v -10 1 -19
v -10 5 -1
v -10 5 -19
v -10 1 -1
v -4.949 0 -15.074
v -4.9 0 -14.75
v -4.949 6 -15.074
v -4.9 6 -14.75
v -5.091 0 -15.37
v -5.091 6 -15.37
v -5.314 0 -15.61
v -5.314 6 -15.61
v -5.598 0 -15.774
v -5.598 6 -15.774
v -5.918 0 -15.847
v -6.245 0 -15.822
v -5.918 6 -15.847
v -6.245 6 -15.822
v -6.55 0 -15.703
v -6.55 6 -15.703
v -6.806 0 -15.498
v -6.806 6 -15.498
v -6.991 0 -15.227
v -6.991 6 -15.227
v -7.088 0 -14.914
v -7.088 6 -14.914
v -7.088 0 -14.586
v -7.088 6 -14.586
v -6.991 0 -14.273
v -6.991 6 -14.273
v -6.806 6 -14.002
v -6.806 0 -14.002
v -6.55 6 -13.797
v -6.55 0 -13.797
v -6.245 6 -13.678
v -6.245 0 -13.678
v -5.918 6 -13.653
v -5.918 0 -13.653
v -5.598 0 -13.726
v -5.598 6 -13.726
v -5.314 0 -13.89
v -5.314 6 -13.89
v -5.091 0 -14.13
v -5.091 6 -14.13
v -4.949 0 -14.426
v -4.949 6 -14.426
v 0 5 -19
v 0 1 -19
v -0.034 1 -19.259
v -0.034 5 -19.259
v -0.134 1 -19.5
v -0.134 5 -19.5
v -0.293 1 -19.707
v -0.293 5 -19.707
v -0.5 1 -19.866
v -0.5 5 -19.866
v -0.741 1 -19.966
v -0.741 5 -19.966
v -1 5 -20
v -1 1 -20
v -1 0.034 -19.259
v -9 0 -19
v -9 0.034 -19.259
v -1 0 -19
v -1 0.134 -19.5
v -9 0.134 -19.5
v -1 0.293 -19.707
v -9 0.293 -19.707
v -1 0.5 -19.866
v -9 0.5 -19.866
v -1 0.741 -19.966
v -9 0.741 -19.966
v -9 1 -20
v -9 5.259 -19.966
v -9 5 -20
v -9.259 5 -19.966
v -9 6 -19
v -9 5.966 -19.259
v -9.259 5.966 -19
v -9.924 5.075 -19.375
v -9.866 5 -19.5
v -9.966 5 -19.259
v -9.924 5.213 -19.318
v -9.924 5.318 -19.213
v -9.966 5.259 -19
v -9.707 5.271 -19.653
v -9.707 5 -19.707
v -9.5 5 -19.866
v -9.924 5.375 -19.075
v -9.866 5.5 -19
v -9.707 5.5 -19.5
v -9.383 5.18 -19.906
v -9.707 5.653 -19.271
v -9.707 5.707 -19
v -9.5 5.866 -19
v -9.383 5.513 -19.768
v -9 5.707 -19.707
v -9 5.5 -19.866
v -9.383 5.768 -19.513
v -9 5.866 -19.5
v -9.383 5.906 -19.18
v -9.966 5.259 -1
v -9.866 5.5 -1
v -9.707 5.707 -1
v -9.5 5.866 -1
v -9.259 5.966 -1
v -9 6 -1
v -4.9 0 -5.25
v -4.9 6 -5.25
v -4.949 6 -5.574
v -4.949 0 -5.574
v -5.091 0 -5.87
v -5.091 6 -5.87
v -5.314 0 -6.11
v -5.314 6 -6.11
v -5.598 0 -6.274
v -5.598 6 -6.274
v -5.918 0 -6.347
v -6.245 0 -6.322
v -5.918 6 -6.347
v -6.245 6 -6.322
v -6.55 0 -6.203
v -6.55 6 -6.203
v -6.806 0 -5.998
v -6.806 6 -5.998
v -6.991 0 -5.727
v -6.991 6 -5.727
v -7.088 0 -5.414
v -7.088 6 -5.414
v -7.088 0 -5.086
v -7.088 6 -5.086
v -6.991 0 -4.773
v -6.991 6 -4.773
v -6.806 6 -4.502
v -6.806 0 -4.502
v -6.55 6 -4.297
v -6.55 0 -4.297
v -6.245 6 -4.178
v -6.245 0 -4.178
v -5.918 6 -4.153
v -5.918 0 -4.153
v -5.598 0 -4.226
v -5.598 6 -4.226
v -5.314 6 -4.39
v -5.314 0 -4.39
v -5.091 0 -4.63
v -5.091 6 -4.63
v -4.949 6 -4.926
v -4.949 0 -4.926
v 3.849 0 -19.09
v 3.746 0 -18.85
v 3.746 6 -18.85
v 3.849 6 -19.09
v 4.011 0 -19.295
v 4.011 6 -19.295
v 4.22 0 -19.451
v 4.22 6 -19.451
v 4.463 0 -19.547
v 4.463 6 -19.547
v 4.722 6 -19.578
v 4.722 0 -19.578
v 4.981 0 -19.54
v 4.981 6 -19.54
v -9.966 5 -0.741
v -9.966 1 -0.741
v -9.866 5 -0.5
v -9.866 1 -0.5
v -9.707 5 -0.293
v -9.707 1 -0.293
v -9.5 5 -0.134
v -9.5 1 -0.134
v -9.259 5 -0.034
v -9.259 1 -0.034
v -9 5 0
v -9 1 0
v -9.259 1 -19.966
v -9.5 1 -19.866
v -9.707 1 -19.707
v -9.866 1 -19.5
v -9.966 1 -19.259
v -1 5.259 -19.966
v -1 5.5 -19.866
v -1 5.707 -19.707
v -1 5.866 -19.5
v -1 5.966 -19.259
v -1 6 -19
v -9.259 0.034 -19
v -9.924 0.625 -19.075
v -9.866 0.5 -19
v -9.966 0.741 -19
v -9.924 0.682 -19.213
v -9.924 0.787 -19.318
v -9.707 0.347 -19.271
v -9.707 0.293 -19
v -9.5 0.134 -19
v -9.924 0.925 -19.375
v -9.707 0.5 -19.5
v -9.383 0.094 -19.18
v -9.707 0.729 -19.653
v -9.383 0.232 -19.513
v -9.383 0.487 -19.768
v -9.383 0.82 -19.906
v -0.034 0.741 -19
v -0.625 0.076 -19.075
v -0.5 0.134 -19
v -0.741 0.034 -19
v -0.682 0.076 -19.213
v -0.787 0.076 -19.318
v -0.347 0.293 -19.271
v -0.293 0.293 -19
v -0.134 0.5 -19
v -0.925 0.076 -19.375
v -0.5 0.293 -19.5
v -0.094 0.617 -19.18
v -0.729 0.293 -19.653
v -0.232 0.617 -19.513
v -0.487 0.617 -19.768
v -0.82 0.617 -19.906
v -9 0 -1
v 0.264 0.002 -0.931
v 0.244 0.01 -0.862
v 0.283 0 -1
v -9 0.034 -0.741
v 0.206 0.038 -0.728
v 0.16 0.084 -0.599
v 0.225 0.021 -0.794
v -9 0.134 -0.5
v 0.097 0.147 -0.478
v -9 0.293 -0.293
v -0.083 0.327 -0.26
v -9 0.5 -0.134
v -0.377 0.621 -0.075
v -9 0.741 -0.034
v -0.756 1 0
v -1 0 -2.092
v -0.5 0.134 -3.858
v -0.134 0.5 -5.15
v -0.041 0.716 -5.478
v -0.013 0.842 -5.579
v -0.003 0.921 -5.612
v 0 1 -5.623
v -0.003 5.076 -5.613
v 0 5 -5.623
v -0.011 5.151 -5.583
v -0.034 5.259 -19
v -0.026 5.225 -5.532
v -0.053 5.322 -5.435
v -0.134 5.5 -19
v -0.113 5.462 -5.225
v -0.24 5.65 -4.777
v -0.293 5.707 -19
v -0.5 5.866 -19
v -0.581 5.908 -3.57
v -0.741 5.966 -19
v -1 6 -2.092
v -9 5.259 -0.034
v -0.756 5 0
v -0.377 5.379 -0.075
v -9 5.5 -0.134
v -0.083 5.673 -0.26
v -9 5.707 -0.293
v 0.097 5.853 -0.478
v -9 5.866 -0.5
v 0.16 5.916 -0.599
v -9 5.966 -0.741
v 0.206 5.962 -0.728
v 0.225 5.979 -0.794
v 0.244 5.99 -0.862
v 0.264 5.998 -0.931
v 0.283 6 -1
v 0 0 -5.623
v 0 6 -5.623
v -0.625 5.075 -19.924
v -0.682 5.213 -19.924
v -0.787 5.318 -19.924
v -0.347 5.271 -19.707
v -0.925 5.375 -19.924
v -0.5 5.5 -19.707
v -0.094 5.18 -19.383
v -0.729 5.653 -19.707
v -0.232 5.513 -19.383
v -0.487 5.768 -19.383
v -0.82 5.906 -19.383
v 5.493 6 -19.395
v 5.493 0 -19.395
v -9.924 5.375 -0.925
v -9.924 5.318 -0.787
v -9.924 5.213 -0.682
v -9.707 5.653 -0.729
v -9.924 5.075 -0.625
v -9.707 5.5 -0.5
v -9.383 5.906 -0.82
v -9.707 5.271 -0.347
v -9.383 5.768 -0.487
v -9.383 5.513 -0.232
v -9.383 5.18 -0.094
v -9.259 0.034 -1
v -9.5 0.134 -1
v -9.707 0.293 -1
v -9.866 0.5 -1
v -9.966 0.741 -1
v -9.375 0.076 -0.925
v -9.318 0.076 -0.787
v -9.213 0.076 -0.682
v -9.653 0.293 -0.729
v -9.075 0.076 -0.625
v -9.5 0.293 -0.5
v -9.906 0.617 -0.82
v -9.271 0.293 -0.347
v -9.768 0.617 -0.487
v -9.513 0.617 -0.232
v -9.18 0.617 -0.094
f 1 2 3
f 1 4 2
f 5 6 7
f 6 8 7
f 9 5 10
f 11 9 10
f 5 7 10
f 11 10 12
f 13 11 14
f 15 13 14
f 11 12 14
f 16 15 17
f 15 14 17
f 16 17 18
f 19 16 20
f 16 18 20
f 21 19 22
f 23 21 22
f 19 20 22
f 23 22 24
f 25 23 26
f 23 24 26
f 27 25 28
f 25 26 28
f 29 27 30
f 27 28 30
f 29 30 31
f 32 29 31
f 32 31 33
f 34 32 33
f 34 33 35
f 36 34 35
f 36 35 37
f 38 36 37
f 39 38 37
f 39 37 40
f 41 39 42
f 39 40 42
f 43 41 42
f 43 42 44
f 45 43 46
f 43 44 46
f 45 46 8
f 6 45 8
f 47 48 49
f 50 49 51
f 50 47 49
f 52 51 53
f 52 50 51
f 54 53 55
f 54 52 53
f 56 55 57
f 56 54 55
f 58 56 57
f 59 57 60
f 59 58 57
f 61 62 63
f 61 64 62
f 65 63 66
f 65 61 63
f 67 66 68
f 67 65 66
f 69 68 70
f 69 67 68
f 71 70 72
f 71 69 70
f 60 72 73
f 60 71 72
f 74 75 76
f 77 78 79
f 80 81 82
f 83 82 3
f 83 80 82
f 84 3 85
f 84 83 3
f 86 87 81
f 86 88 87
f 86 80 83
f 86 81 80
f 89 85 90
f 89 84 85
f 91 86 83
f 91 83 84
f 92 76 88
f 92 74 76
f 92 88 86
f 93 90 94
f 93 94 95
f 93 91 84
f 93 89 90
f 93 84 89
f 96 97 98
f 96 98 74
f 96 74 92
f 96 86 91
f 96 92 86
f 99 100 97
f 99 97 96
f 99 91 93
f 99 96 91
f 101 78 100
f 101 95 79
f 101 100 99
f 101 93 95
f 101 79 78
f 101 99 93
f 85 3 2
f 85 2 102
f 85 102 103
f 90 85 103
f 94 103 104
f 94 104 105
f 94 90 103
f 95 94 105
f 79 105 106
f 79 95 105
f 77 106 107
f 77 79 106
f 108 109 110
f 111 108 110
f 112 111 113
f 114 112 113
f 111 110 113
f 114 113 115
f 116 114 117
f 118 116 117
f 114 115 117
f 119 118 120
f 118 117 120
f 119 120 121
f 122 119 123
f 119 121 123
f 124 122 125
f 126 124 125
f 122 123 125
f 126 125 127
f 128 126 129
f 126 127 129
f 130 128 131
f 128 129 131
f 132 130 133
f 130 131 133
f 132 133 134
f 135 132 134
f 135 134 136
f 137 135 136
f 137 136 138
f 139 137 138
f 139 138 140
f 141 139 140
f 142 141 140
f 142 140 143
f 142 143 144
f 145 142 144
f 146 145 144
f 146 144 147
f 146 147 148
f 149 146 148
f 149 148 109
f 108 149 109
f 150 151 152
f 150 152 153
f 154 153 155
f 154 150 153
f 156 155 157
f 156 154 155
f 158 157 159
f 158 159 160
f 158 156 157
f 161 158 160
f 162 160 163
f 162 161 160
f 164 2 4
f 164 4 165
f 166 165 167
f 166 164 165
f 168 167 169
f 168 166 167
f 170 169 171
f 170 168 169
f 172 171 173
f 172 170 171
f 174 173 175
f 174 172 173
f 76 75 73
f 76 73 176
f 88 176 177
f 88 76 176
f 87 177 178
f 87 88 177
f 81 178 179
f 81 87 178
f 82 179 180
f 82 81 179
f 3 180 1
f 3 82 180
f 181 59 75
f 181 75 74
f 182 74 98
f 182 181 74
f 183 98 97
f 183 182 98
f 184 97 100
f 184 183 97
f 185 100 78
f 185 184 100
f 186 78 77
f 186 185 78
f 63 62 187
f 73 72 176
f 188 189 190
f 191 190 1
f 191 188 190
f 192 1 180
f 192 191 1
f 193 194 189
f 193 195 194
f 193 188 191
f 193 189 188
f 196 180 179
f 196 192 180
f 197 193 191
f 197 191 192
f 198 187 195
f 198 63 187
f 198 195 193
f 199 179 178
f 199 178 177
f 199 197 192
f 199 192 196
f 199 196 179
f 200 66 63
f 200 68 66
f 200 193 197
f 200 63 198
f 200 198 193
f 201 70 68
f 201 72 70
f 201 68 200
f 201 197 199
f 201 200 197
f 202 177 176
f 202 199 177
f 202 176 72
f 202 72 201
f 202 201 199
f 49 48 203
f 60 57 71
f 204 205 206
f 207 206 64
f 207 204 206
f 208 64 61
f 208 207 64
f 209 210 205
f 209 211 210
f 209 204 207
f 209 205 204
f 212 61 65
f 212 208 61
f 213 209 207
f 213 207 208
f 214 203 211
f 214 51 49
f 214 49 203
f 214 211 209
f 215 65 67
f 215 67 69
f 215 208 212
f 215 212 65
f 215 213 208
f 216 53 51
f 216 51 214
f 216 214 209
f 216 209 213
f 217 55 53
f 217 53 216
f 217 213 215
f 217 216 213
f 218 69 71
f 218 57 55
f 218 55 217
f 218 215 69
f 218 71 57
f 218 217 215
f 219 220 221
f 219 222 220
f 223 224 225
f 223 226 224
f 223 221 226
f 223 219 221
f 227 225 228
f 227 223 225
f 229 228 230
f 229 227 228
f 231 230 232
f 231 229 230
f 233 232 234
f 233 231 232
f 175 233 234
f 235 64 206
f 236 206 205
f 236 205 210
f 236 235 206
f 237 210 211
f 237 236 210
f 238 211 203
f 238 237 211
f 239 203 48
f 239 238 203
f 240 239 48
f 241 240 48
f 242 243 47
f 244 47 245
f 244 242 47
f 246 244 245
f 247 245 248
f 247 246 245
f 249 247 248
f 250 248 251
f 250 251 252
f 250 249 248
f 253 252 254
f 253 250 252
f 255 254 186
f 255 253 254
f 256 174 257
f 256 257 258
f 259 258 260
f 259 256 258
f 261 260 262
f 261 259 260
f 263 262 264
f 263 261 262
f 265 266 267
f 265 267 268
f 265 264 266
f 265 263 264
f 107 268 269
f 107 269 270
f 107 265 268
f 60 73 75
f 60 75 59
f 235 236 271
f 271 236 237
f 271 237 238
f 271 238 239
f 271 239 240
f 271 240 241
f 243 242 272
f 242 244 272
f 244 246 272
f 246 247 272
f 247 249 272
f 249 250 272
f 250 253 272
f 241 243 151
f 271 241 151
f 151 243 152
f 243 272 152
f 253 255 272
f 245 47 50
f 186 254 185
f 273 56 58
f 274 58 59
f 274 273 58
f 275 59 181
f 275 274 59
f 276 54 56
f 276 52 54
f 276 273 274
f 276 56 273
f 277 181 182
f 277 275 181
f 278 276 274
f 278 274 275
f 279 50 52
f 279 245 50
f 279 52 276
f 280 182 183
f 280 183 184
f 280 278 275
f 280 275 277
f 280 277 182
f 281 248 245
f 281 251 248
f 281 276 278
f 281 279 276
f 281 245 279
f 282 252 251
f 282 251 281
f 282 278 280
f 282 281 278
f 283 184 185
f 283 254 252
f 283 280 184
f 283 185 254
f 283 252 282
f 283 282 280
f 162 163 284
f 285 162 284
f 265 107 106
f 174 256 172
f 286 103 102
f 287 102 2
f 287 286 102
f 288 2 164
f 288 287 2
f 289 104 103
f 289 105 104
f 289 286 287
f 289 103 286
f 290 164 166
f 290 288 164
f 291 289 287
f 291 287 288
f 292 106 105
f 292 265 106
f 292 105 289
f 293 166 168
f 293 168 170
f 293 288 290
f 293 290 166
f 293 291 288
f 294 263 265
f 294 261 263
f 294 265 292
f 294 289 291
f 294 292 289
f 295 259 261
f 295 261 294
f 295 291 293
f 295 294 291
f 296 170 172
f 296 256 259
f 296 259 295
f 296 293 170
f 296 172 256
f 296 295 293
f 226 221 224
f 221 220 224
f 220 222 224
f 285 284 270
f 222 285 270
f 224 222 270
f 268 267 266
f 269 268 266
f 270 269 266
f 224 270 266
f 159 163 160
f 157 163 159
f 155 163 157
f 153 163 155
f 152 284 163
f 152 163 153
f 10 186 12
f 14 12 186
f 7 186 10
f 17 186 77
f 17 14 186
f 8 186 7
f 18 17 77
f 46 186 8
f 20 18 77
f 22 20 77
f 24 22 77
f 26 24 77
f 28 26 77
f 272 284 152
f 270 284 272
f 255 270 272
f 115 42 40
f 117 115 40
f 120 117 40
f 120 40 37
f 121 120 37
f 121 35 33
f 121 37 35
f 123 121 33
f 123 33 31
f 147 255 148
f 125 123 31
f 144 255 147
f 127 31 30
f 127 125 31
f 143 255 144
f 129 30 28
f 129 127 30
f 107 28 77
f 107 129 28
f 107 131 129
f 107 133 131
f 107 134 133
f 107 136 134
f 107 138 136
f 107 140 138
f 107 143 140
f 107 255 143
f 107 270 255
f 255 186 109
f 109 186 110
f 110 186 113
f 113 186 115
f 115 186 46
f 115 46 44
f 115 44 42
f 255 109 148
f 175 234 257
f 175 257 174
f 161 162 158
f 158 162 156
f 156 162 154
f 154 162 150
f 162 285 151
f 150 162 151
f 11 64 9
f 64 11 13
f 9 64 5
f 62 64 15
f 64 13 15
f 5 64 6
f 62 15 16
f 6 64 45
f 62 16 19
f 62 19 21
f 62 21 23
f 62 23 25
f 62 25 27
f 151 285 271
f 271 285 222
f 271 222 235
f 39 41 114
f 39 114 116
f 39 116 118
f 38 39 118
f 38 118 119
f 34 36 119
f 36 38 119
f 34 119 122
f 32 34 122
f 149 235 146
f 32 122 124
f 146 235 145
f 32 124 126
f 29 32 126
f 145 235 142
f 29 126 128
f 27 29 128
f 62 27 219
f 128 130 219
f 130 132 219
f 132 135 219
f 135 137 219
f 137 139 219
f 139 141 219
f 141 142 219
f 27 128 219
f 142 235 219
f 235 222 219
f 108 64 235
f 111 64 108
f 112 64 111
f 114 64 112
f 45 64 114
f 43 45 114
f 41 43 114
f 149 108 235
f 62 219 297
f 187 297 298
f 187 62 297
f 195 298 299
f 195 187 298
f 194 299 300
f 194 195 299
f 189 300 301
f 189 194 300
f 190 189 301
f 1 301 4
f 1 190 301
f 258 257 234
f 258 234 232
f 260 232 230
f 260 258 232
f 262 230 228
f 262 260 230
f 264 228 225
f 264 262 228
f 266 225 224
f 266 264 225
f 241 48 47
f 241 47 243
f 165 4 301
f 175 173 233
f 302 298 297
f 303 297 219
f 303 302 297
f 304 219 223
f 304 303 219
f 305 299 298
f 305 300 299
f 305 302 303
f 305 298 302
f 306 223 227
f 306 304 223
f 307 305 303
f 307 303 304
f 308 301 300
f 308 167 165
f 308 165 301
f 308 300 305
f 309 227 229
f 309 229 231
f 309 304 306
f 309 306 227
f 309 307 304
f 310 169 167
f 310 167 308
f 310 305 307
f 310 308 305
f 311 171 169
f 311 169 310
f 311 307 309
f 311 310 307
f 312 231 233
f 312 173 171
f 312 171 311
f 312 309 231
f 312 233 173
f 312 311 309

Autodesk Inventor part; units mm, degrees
ref_plane "YZ Plane" through (0, 0, 0) normal (1, 0, 0) x (0, 1, 0)
ref_plane "XZ Plane" through (0, 0, 0) normal (0, 1, 0) x (-1, 0, 0)
ref_plane "XY Plane" through (0, 0, 0) normal (0, 0, 1) x (1, 0, 0)
sketch "Sketch1" plane through (0, 0, 0) normal (0, 1, 0) x (-1, 0, 0)
  line L0 (0, 0) -> (10, 0)
  line L1 (10, 0) -> (10, -20)
  line L2 (10, -20) -> (0, -20)
  line L3 (0, -20) -> (0, 0)
  dimension "d0" = 20
  dimension "d1" = 10
extrude "Extrusion1" add sketch "Sketch1" along normal blind 6
sketch "Sketch2" plane through (0, 6, 0) normal (0, 1, 0) x (1, 0, 0)
  circle A0 centre (-6, 5.25) radius 1.1
  circle A1 centre (-6, 14.75) radius 1.1
  line L0 (-10, 20) -> (-10, 0) projected
  line L1 (0, 20) -> (-10, 20) projected
  point P0 (0, 0)
  dimension "d4" = 2.2
  dimension "d5" = 2.2
  dimension "d6" = 9.5
  dimension "d7" = 4
  dimension "d8" = 4
  dimension "d9" = 5.25
extrude "Extrusion2" cut sketch "Sketch2" against normal blind 6
sketch "Sketch3" plane through (0, 6, 0) normal (0, 1, 0) x (1, 0, 0)
  line L0 (-1.1092, 1.7066) -> (4.0185, 19.8124)
  line L1 (4.0185, 19.8124) -> (5.4927, 19.3949)
  line L2 (-10, 0) -> (0, 0) projected
  line L3 (5.4927, 19.3949) -> (0, 0)
  line L4 (-1.1092, 1.7066) -> (0, 0)
extrude "Extrusion3" add sketch "Sketch3" against normal blind 6
fillet "Fillet1" radius 1 13 edges at (0, 6, -12.8116) (0, 3, -20) (-5, 6, -20) (-5, 0, -20) (-5, 6, 0) (-10, 6, -10) (-10, 3, 0) (-10, 0, -10) (-10, 3, -20) (-5, 0, 0) (0, 3, 0) (0, 0, -12.8116) (4.0185, 3, -19.8124)
properties part number "Endstop"
